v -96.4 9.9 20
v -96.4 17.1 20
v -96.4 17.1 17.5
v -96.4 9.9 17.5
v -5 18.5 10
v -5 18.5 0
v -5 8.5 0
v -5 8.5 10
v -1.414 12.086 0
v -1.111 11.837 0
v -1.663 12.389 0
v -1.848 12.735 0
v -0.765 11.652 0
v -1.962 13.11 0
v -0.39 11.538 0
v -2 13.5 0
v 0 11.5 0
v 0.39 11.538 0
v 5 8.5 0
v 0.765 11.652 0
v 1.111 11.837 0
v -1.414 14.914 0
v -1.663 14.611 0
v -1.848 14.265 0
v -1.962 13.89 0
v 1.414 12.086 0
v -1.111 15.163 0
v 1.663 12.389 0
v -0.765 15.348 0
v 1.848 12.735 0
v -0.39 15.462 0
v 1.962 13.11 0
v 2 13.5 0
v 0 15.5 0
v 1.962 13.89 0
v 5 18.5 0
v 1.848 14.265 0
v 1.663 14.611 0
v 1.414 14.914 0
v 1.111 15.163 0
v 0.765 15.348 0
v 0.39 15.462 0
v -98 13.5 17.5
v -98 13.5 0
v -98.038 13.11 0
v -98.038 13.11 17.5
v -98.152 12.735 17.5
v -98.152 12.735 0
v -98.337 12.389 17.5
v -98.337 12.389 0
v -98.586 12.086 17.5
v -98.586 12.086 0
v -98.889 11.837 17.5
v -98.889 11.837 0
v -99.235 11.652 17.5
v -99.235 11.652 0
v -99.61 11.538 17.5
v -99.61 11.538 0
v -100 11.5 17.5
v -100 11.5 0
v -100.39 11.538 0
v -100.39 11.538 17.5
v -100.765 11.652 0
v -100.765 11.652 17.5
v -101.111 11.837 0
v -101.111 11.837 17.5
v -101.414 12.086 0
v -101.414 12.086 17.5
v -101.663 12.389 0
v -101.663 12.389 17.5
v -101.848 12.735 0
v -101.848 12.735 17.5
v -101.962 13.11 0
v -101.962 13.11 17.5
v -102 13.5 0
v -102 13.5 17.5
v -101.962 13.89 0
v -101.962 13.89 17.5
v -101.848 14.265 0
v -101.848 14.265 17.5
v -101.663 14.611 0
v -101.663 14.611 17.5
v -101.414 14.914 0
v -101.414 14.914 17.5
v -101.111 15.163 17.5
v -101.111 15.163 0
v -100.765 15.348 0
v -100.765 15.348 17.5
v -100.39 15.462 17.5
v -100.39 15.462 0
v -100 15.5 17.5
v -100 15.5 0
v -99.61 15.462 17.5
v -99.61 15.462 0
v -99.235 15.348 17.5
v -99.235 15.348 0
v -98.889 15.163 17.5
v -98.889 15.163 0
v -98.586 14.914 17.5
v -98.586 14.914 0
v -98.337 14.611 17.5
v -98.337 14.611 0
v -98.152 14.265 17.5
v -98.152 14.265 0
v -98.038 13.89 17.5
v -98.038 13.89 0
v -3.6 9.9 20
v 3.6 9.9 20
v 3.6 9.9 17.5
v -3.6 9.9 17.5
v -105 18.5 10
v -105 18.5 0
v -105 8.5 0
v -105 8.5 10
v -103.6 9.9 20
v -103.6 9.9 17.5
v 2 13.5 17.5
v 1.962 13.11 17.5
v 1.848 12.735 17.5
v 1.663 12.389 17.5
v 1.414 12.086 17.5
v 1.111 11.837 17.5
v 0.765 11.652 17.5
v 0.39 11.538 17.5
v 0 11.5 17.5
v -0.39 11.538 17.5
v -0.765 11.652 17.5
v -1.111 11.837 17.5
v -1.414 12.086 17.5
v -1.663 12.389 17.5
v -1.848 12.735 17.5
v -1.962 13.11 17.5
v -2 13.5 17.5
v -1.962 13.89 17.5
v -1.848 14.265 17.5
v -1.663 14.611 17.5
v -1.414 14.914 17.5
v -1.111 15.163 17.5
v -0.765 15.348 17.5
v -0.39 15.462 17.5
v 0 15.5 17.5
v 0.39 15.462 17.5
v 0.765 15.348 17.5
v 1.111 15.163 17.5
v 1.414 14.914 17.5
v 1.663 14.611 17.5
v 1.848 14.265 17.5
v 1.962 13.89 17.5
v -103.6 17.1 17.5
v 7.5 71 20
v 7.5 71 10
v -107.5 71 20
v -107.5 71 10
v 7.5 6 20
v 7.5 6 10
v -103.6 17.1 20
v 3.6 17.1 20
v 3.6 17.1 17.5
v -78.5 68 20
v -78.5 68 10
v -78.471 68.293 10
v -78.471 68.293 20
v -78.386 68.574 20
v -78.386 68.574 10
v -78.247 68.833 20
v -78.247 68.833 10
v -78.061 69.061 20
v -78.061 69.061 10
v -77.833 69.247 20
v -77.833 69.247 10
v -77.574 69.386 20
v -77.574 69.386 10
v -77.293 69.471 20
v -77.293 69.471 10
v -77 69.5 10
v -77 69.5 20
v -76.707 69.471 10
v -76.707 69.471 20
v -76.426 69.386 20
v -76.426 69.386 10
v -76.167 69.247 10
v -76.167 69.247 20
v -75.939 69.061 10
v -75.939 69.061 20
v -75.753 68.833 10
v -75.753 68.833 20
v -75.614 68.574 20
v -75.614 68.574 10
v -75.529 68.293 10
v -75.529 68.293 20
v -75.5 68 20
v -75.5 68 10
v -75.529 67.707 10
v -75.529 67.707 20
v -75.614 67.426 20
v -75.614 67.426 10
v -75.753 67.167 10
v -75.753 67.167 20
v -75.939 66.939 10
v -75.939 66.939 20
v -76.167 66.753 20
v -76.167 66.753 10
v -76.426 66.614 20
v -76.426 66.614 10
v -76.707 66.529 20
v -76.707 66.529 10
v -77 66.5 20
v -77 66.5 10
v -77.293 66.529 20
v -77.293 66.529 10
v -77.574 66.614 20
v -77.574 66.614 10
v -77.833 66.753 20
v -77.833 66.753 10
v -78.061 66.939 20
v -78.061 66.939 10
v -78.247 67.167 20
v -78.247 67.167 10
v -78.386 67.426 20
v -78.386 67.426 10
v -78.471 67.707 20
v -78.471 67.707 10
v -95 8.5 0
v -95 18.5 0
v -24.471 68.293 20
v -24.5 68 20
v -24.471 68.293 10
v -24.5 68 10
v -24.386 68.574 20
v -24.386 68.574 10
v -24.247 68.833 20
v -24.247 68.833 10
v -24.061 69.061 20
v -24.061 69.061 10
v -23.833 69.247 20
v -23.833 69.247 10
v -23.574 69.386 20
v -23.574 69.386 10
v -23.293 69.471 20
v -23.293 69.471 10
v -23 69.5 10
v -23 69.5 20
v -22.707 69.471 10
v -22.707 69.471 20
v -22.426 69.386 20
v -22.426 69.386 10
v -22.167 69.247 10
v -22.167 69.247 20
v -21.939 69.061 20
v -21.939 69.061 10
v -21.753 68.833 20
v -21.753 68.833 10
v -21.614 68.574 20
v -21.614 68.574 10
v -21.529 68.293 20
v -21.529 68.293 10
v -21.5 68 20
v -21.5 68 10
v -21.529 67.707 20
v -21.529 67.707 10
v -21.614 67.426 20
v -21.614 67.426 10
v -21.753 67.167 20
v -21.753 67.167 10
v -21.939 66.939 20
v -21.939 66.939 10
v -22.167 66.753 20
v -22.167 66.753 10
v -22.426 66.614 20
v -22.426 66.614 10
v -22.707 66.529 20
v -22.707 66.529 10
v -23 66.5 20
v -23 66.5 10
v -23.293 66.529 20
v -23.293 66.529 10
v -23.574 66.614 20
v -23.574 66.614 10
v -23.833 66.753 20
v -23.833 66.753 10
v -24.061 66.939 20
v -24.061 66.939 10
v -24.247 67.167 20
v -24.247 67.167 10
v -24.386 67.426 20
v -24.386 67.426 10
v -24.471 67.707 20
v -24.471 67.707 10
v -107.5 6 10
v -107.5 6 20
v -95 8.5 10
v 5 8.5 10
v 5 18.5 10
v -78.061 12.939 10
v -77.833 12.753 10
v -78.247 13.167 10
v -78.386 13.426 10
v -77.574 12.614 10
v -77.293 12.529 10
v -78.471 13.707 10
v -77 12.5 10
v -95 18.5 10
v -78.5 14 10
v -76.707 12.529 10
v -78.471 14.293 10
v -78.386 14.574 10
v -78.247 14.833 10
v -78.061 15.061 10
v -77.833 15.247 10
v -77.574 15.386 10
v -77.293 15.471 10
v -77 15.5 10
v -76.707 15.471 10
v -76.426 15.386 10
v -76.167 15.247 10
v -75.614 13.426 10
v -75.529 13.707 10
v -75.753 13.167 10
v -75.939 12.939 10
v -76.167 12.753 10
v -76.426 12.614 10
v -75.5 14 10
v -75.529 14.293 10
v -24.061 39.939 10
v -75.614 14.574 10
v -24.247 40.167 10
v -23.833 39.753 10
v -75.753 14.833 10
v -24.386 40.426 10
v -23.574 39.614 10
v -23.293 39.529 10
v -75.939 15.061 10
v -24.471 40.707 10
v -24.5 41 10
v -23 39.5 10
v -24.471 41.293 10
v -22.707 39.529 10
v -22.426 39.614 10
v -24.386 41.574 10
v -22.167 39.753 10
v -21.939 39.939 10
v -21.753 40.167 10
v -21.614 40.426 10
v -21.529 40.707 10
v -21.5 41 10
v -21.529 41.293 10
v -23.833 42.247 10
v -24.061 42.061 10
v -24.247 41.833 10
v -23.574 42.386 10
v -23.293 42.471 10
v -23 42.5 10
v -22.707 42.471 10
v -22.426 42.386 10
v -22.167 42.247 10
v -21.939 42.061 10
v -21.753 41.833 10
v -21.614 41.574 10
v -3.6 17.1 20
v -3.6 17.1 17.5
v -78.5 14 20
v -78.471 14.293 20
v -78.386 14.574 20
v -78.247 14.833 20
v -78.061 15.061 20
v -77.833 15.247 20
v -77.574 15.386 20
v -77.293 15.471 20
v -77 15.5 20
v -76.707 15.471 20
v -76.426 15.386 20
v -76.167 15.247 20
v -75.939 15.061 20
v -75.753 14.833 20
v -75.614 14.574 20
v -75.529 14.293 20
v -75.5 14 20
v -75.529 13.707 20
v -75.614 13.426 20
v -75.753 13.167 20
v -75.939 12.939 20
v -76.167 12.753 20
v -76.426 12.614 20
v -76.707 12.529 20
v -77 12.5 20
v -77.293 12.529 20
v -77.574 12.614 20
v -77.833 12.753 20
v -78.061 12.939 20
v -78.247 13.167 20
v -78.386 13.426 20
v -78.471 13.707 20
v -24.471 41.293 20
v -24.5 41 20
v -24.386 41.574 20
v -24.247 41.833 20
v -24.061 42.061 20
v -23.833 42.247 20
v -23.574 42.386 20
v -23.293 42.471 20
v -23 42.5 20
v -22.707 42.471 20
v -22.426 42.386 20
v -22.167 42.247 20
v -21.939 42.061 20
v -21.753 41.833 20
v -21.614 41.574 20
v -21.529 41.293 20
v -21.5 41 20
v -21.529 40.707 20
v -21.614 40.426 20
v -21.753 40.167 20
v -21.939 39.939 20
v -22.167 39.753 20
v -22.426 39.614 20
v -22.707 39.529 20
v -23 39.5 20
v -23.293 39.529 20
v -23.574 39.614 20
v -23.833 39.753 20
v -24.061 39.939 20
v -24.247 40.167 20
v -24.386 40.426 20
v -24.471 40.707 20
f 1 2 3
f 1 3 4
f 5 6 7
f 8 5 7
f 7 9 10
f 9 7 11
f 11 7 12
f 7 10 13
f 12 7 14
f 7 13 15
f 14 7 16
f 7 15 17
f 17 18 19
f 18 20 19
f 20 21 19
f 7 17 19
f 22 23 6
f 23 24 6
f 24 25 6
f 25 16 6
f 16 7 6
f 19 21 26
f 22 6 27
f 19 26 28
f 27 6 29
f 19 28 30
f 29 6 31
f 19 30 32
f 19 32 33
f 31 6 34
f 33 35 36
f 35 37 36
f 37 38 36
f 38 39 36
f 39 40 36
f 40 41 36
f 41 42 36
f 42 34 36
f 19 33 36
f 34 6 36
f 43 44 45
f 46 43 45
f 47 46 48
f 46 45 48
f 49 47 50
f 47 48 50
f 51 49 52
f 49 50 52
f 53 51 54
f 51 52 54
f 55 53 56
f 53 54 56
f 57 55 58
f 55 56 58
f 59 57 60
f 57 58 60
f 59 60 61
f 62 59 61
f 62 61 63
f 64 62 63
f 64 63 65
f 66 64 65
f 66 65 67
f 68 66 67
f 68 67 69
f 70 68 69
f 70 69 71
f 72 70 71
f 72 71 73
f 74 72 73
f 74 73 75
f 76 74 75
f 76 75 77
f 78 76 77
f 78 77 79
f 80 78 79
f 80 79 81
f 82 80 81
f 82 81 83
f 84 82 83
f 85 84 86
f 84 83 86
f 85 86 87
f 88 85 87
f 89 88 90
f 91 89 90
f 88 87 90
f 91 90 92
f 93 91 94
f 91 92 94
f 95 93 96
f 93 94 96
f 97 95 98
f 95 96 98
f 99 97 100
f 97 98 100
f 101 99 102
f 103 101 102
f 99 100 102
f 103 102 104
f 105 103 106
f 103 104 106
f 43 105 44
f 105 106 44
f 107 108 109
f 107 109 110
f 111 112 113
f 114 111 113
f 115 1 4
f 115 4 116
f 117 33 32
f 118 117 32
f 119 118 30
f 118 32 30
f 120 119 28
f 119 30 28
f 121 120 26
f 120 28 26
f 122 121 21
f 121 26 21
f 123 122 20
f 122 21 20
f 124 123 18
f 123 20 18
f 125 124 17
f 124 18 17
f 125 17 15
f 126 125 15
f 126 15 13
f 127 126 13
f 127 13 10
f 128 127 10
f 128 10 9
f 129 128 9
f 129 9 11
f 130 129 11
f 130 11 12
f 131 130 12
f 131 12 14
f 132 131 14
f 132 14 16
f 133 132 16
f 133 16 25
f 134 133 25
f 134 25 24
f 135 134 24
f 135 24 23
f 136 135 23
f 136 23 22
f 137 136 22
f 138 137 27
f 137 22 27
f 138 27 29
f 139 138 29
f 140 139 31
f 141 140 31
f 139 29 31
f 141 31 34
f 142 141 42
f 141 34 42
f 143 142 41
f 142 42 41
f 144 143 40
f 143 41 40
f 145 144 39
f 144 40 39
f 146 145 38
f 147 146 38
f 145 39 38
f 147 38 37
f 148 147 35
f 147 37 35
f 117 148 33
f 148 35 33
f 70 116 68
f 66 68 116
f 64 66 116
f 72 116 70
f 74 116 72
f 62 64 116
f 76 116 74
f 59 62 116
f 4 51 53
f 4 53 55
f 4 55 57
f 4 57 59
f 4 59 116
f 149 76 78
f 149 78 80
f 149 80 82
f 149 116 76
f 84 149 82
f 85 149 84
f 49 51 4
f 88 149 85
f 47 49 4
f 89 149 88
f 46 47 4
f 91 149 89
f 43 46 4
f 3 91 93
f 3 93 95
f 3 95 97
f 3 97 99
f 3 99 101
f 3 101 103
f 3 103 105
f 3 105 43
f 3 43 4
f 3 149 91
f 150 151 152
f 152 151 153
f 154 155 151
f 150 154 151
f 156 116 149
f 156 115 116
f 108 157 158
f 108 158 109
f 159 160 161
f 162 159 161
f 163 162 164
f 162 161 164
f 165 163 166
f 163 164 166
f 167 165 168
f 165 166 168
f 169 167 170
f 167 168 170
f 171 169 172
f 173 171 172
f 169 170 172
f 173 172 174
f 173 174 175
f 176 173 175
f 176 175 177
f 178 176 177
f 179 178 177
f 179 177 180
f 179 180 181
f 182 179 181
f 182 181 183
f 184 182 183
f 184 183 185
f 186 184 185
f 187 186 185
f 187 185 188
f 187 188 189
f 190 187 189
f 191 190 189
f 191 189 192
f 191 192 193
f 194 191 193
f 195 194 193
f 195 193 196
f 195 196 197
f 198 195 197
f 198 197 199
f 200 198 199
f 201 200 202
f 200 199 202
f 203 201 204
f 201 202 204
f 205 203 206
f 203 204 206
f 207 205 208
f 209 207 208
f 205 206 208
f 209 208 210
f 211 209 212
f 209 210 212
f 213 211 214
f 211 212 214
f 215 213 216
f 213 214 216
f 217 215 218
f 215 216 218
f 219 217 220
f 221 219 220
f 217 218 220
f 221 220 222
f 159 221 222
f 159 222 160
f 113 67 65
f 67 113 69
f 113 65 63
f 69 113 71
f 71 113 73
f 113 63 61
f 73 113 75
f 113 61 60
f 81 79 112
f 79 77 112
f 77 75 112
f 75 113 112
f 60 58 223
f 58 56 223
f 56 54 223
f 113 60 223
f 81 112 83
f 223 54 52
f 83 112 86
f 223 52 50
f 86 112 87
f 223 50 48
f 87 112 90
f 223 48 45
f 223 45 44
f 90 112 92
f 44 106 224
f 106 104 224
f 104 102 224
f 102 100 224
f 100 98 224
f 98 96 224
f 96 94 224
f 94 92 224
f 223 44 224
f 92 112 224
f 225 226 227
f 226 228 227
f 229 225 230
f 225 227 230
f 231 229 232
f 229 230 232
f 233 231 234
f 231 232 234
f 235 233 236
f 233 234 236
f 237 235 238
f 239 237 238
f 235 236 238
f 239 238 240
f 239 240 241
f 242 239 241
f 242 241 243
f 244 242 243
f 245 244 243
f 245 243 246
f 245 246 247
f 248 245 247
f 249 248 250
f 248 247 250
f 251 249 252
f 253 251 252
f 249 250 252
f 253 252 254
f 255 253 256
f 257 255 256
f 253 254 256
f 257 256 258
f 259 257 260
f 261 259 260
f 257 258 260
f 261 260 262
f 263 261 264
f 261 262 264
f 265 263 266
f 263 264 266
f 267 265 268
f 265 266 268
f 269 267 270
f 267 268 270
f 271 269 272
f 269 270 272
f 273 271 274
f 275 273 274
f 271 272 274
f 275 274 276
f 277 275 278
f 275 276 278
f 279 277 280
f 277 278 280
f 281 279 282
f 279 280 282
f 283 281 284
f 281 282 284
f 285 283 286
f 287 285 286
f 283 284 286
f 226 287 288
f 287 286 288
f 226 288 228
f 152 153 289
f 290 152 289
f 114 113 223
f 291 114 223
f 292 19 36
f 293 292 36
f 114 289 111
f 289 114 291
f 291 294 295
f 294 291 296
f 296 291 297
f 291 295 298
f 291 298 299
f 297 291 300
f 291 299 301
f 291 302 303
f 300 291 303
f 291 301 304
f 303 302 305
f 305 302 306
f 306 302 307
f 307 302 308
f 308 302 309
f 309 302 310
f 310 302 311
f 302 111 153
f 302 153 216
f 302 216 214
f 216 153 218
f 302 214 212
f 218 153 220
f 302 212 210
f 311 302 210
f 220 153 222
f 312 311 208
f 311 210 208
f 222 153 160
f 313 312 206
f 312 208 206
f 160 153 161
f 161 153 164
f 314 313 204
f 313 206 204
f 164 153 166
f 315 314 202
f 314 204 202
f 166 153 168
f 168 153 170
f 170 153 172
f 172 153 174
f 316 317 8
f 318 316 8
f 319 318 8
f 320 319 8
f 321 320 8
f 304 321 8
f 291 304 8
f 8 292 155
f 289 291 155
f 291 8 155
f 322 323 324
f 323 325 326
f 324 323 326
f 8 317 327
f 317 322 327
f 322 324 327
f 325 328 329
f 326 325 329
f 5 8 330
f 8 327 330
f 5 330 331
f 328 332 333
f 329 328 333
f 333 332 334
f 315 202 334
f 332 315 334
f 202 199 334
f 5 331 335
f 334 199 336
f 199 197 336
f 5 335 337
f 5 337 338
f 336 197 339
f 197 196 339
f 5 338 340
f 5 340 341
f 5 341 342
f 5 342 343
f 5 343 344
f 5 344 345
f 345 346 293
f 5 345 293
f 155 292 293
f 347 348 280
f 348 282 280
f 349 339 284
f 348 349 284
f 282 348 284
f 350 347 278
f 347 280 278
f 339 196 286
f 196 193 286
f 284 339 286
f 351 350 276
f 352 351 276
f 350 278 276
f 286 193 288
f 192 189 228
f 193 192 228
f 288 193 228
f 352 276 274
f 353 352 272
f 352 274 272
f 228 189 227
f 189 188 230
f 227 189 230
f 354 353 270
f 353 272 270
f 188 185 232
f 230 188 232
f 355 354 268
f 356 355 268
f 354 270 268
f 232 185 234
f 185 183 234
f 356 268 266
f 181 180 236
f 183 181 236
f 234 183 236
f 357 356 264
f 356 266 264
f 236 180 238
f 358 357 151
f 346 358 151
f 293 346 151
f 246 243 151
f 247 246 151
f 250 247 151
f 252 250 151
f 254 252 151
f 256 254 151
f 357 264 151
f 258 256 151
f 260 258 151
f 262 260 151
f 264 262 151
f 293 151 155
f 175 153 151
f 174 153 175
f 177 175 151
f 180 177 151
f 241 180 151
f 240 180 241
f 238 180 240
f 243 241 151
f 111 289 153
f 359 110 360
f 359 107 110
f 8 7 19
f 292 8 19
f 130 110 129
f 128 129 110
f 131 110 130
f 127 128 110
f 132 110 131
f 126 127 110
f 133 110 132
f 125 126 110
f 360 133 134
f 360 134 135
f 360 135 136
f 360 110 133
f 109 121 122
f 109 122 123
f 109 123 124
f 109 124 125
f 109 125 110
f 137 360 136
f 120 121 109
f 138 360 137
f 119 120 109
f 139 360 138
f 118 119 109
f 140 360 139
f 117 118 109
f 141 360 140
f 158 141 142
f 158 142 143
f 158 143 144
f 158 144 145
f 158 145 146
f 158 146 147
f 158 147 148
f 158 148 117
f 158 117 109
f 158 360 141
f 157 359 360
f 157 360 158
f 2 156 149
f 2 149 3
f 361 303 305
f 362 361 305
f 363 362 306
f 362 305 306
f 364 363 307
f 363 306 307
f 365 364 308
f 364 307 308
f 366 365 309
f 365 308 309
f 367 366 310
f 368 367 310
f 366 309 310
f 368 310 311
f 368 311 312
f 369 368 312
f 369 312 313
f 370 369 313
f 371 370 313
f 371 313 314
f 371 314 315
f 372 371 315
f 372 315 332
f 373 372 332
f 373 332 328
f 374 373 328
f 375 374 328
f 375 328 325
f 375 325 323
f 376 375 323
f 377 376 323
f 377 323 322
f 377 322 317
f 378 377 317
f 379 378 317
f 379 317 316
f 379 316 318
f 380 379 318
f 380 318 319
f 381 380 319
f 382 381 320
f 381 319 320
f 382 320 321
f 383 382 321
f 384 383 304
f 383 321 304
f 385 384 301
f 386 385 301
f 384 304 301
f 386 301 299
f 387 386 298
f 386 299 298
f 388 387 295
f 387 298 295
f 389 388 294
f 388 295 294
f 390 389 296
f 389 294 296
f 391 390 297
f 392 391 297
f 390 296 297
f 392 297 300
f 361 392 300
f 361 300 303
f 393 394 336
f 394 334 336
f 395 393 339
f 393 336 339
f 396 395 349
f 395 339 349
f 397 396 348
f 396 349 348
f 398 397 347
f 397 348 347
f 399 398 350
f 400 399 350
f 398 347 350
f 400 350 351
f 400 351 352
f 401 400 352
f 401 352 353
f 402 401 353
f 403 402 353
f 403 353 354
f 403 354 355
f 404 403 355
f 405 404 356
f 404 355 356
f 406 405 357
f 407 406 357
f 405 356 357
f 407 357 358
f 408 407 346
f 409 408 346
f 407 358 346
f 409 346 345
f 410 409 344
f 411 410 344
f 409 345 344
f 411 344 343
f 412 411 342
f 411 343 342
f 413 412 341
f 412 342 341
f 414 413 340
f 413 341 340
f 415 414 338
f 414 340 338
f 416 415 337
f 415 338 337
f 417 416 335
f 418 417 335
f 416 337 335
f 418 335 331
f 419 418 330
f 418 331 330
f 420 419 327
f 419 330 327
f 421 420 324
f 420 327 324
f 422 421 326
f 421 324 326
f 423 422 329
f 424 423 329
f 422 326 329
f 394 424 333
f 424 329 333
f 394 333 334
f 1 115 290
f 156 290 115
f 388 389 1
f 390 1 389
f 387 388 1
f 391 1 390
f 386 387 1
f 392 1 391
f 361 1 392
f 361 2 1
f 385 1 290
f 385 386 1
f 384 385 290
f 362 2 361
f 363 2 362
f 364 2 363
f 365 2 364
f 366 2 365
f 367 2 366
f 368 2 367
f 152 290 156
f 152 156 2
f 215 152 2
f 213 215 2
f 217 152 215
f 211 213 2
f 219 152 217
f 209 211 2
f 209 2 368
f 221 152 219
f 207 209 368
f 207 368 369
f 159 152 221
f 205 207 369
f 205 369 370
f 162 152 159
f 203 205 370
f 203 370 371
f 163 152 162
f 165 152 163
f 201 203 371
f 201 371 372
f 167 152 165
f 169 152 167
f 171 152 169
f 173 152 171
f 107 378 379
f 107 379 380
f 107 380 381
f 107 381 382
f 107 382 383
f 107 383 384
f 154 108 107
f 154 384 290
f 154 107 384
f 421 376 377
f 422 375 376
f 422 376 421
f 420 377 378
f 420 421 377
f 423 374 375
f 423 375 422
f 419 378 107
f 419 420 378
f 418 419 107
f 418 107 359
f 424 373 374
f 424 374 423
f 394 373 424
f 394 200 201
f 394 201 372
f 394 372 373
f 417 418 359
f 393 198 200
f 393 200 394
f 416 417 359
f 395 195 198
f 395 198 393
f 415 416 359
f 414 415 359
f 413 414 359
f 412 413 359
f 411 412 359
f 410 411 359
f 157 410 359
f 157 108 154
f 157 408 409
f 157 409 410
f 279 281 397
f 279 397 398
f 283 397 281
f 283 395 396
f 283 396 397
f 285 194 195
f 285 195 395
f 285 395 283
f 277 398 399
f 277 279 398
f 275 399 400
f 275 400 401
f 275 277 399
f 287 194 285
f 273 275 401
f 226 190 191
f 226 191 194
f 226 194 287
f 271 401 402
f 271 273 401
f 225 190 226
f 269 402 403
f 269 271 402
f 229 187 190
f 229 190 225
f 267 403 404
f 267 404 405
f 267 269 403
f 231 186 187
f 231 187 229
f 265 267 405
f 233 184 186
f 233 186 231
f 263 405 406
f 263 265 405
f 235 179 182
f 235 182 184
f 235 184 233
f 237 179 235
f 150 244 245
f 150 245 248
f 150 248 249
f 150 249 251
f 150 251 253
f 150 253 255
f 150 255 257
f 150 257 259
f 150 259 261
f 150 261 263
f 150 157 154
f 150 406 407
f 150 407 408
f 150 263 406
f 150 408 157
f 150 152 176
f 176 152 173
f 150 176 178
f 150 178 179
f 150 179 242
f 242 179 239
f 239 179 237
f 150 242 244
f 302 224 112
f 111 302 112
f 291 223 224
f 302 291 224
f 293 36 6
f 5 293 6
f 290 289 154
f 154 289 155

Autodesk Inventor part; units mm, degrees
ref_plane "YZ Plane" through (0, 0, 0) normal (1, 0, 0) x (0, 1, 0)
ref_plane "XZ Plane" through (0, 0, 0) normal (0, 1, 0) x (-1, 0, 0)
ref_plane "XY Plane" through (0, 0, 0) normal (0, 0, 1) x (1, 0, 0)
sketch "Sketch1" plane through (0, 0, 0) normal (0, 0, 1) x (1, 0, 0)
  circle A0 centre (0, 13.5) radius 2 projected
  circle A1 centre (-100, 13.5) radius 2 projected
  line L0 (-100, 13.5) -> (-105, 13.5) construction
  line L1 (-100, 13.5) -> (-95, 13.5) construction
  line L2 (-105, 13.5) -> (-105, 8.5) construction
  line L3 (-105, 8.5) -> (-95, 8.5)
  line L4 (-95, 8.5) -> (-95, 18.5)
  line L5 (-95, 18.5) -> (-105, 18.5)
  line L6 (-105, 18.5) -> (-105, 8.5)
  line L7 (-5, 8.5) -> (5, 8.5)
  line L8 (5, 8.5) -> (5, 18.5)
  line L9 (5, 18.5) -> (-5, 18.5)
  line L10 (-5, 18.5) -> (-5, 8.5)
  line L11 (-5, 8.5) -> (5, 18.5) construction
  line L12 (5, 8.5) -> (-5, 18.5) construction
  point P0 (0, 0)
  dimension "d0" = 5
  dimension "d1" = 180
  dimension "d2" = 5
  dimension "d3" = 90
  dimension "d4" = 10
  dimension "d5" = 10
  dimension "d6" = 10
  dimension "d7" = 10
extrude "Extrusion1" add sketch "Sketch1" along normal blind 10
sketch "Sketch2" plane through (0, 0, 10) normal (0, 0, 1) x (1, 0, 0)
  circle A0 centre (-100, 13.5) radius 2 projected
  line L0 (-105, 8.5) -> (-95, 8.5) projected
  line L1 (-95, 8.5) -> (-95, 18.5) projected
  line L2 (-95, 18.5) -> (-105, 18.5) construction
  line L3 (-105, 18.5) -> (-105, 8.5) projected
  line L4 (-92.5, 21) -> (-107.5, 21) construction
  line L5 (-107.5, 21) -> (-107.5, 6) construction
  line L6 (-107.5, 6) -> (-92.5, 6) construction
  line L7 (-92.5, 6) -> (-92.5, 21) construction
  circle A1 centre (-100, 13.5) radius 2 construction
  line L8 (-92.5, 21) -> (-107.5, 6) construction
  line L9 (-107.5, 21) -> (-92.5, 6) construction
  line L10 (-107.5, 6) -> (7.5, 6)
  line L11 (7.5, 6) -> (7.5, 71)
  line L12 (7.5, 71) -> (-107.5, 71)
  line L13 (-107.5, 71) -> (-107.5, 6)
  circle A2 centre (0, 13.5) radius 2 projected
  point P0 (0, 0)
  dimension "d10" = 15
  dimension "d11" = 15
  dimension "d12" = 115
  dimension "d13" = 65
extrude "Extrusion2" add sketch "Sketch2" along normal blind 10
sketch "Sketch3" plane through (0, 0, 20) normal (0, 0, 1) x (1, 0, 0)
  circle A0 centre (-100, 13.5) radius 2 construction
  circle A1 centre (0, 13.5) radius 2 construction
  line L0 (-103.6, 17.1) -> (-96.4, 17.1)
  line L1 (-96.4, 17.1) -> (-96.4, 9.9)
  line L2 (-96.4, 9.9) -> (-103.6, 9.9)
  line L3 (-103.6, 9.9) -> (-103.6, 17.1)
  line L4 (-103.6, 17.1) -> (-96.4, 9.9) construction
  line L5 (-96.4, 17.1) -> (-103.6, 9.9) construction
  line L6 (-3.6, 17.1) -> (3.6, 17.1)
  line L7 (3.6, 17.1) -> (3.6, 9.9)
  line L8 (3.6, 9.9) -> (-3.6, 9.9)
  line L9 (-3.6, 9.9) -> (-3.6, 17.1)
  line L10 (-3.6, 17.1) -> (3.6, 9.9) construction
  line L11 (3.6, 17.1) -> (-3.6, 9.9) construction
  point P0 (0, 0)
  dimension "d16" = 7.2
  dimension "d17" = 7.2
  dimension "d18" = 7.2
  dimension "d19" = 7.2
extrude "Extrusion3" cut sketch "Sketch3" against normal blind 2.5
sketch "Sketch4" plane through (0, 0, 10) normal (0, 0, -1) x (-1, 0, 0)
  line L0 (-7.5, 6) -> (-7.5, 71) construction
  line L1 (-7.5, 71) -> (20, 71) construction
  line L2 (-7.5, 71) -> (107.5, 71) construction
  line L3 (20, 71) -> (23, 71) construction
  line L4 (23, 71) -> (23, 68) construction
  line L5 (23, 68) -> (20, 68) construction
  line L6 (20, 68) -> (20, 71) construction
  line L7 (23, 68) -> (77, 68) construction
  line L8 (77, 68) -> (77, 14) construction
  line L9 (23, 68) -> (23, 41) construction
  line L10 (23, 68) -> (50, 68) construction
  circle A0 centre (77, 68) radius 1.5
  circle A1 centre (77, 14) radius 1.5
  circle A2 centre (23, 68) radius 1.5
  circle A3 centre (23, 41) radius 1.5
  point P0 (0, 0)
  dimension "d22" = 27.5
  dimension "d23" = 3
  dimension "d24" = 3
  dimension "d25" = 54
  dimension "d26" = 54
  dimension "d27" = 90
  dimension "d28" = 27
  dimension "d29" = 90
  dimension "d30" = 3
  dimension "d31" = 3
  dimension "d32" = 3
  dimension "d33" = 3
extrude "Extrusion4" cut sketch "Sketch4" against normal up to surface (10 mm away)
properties part number "base_plate"
